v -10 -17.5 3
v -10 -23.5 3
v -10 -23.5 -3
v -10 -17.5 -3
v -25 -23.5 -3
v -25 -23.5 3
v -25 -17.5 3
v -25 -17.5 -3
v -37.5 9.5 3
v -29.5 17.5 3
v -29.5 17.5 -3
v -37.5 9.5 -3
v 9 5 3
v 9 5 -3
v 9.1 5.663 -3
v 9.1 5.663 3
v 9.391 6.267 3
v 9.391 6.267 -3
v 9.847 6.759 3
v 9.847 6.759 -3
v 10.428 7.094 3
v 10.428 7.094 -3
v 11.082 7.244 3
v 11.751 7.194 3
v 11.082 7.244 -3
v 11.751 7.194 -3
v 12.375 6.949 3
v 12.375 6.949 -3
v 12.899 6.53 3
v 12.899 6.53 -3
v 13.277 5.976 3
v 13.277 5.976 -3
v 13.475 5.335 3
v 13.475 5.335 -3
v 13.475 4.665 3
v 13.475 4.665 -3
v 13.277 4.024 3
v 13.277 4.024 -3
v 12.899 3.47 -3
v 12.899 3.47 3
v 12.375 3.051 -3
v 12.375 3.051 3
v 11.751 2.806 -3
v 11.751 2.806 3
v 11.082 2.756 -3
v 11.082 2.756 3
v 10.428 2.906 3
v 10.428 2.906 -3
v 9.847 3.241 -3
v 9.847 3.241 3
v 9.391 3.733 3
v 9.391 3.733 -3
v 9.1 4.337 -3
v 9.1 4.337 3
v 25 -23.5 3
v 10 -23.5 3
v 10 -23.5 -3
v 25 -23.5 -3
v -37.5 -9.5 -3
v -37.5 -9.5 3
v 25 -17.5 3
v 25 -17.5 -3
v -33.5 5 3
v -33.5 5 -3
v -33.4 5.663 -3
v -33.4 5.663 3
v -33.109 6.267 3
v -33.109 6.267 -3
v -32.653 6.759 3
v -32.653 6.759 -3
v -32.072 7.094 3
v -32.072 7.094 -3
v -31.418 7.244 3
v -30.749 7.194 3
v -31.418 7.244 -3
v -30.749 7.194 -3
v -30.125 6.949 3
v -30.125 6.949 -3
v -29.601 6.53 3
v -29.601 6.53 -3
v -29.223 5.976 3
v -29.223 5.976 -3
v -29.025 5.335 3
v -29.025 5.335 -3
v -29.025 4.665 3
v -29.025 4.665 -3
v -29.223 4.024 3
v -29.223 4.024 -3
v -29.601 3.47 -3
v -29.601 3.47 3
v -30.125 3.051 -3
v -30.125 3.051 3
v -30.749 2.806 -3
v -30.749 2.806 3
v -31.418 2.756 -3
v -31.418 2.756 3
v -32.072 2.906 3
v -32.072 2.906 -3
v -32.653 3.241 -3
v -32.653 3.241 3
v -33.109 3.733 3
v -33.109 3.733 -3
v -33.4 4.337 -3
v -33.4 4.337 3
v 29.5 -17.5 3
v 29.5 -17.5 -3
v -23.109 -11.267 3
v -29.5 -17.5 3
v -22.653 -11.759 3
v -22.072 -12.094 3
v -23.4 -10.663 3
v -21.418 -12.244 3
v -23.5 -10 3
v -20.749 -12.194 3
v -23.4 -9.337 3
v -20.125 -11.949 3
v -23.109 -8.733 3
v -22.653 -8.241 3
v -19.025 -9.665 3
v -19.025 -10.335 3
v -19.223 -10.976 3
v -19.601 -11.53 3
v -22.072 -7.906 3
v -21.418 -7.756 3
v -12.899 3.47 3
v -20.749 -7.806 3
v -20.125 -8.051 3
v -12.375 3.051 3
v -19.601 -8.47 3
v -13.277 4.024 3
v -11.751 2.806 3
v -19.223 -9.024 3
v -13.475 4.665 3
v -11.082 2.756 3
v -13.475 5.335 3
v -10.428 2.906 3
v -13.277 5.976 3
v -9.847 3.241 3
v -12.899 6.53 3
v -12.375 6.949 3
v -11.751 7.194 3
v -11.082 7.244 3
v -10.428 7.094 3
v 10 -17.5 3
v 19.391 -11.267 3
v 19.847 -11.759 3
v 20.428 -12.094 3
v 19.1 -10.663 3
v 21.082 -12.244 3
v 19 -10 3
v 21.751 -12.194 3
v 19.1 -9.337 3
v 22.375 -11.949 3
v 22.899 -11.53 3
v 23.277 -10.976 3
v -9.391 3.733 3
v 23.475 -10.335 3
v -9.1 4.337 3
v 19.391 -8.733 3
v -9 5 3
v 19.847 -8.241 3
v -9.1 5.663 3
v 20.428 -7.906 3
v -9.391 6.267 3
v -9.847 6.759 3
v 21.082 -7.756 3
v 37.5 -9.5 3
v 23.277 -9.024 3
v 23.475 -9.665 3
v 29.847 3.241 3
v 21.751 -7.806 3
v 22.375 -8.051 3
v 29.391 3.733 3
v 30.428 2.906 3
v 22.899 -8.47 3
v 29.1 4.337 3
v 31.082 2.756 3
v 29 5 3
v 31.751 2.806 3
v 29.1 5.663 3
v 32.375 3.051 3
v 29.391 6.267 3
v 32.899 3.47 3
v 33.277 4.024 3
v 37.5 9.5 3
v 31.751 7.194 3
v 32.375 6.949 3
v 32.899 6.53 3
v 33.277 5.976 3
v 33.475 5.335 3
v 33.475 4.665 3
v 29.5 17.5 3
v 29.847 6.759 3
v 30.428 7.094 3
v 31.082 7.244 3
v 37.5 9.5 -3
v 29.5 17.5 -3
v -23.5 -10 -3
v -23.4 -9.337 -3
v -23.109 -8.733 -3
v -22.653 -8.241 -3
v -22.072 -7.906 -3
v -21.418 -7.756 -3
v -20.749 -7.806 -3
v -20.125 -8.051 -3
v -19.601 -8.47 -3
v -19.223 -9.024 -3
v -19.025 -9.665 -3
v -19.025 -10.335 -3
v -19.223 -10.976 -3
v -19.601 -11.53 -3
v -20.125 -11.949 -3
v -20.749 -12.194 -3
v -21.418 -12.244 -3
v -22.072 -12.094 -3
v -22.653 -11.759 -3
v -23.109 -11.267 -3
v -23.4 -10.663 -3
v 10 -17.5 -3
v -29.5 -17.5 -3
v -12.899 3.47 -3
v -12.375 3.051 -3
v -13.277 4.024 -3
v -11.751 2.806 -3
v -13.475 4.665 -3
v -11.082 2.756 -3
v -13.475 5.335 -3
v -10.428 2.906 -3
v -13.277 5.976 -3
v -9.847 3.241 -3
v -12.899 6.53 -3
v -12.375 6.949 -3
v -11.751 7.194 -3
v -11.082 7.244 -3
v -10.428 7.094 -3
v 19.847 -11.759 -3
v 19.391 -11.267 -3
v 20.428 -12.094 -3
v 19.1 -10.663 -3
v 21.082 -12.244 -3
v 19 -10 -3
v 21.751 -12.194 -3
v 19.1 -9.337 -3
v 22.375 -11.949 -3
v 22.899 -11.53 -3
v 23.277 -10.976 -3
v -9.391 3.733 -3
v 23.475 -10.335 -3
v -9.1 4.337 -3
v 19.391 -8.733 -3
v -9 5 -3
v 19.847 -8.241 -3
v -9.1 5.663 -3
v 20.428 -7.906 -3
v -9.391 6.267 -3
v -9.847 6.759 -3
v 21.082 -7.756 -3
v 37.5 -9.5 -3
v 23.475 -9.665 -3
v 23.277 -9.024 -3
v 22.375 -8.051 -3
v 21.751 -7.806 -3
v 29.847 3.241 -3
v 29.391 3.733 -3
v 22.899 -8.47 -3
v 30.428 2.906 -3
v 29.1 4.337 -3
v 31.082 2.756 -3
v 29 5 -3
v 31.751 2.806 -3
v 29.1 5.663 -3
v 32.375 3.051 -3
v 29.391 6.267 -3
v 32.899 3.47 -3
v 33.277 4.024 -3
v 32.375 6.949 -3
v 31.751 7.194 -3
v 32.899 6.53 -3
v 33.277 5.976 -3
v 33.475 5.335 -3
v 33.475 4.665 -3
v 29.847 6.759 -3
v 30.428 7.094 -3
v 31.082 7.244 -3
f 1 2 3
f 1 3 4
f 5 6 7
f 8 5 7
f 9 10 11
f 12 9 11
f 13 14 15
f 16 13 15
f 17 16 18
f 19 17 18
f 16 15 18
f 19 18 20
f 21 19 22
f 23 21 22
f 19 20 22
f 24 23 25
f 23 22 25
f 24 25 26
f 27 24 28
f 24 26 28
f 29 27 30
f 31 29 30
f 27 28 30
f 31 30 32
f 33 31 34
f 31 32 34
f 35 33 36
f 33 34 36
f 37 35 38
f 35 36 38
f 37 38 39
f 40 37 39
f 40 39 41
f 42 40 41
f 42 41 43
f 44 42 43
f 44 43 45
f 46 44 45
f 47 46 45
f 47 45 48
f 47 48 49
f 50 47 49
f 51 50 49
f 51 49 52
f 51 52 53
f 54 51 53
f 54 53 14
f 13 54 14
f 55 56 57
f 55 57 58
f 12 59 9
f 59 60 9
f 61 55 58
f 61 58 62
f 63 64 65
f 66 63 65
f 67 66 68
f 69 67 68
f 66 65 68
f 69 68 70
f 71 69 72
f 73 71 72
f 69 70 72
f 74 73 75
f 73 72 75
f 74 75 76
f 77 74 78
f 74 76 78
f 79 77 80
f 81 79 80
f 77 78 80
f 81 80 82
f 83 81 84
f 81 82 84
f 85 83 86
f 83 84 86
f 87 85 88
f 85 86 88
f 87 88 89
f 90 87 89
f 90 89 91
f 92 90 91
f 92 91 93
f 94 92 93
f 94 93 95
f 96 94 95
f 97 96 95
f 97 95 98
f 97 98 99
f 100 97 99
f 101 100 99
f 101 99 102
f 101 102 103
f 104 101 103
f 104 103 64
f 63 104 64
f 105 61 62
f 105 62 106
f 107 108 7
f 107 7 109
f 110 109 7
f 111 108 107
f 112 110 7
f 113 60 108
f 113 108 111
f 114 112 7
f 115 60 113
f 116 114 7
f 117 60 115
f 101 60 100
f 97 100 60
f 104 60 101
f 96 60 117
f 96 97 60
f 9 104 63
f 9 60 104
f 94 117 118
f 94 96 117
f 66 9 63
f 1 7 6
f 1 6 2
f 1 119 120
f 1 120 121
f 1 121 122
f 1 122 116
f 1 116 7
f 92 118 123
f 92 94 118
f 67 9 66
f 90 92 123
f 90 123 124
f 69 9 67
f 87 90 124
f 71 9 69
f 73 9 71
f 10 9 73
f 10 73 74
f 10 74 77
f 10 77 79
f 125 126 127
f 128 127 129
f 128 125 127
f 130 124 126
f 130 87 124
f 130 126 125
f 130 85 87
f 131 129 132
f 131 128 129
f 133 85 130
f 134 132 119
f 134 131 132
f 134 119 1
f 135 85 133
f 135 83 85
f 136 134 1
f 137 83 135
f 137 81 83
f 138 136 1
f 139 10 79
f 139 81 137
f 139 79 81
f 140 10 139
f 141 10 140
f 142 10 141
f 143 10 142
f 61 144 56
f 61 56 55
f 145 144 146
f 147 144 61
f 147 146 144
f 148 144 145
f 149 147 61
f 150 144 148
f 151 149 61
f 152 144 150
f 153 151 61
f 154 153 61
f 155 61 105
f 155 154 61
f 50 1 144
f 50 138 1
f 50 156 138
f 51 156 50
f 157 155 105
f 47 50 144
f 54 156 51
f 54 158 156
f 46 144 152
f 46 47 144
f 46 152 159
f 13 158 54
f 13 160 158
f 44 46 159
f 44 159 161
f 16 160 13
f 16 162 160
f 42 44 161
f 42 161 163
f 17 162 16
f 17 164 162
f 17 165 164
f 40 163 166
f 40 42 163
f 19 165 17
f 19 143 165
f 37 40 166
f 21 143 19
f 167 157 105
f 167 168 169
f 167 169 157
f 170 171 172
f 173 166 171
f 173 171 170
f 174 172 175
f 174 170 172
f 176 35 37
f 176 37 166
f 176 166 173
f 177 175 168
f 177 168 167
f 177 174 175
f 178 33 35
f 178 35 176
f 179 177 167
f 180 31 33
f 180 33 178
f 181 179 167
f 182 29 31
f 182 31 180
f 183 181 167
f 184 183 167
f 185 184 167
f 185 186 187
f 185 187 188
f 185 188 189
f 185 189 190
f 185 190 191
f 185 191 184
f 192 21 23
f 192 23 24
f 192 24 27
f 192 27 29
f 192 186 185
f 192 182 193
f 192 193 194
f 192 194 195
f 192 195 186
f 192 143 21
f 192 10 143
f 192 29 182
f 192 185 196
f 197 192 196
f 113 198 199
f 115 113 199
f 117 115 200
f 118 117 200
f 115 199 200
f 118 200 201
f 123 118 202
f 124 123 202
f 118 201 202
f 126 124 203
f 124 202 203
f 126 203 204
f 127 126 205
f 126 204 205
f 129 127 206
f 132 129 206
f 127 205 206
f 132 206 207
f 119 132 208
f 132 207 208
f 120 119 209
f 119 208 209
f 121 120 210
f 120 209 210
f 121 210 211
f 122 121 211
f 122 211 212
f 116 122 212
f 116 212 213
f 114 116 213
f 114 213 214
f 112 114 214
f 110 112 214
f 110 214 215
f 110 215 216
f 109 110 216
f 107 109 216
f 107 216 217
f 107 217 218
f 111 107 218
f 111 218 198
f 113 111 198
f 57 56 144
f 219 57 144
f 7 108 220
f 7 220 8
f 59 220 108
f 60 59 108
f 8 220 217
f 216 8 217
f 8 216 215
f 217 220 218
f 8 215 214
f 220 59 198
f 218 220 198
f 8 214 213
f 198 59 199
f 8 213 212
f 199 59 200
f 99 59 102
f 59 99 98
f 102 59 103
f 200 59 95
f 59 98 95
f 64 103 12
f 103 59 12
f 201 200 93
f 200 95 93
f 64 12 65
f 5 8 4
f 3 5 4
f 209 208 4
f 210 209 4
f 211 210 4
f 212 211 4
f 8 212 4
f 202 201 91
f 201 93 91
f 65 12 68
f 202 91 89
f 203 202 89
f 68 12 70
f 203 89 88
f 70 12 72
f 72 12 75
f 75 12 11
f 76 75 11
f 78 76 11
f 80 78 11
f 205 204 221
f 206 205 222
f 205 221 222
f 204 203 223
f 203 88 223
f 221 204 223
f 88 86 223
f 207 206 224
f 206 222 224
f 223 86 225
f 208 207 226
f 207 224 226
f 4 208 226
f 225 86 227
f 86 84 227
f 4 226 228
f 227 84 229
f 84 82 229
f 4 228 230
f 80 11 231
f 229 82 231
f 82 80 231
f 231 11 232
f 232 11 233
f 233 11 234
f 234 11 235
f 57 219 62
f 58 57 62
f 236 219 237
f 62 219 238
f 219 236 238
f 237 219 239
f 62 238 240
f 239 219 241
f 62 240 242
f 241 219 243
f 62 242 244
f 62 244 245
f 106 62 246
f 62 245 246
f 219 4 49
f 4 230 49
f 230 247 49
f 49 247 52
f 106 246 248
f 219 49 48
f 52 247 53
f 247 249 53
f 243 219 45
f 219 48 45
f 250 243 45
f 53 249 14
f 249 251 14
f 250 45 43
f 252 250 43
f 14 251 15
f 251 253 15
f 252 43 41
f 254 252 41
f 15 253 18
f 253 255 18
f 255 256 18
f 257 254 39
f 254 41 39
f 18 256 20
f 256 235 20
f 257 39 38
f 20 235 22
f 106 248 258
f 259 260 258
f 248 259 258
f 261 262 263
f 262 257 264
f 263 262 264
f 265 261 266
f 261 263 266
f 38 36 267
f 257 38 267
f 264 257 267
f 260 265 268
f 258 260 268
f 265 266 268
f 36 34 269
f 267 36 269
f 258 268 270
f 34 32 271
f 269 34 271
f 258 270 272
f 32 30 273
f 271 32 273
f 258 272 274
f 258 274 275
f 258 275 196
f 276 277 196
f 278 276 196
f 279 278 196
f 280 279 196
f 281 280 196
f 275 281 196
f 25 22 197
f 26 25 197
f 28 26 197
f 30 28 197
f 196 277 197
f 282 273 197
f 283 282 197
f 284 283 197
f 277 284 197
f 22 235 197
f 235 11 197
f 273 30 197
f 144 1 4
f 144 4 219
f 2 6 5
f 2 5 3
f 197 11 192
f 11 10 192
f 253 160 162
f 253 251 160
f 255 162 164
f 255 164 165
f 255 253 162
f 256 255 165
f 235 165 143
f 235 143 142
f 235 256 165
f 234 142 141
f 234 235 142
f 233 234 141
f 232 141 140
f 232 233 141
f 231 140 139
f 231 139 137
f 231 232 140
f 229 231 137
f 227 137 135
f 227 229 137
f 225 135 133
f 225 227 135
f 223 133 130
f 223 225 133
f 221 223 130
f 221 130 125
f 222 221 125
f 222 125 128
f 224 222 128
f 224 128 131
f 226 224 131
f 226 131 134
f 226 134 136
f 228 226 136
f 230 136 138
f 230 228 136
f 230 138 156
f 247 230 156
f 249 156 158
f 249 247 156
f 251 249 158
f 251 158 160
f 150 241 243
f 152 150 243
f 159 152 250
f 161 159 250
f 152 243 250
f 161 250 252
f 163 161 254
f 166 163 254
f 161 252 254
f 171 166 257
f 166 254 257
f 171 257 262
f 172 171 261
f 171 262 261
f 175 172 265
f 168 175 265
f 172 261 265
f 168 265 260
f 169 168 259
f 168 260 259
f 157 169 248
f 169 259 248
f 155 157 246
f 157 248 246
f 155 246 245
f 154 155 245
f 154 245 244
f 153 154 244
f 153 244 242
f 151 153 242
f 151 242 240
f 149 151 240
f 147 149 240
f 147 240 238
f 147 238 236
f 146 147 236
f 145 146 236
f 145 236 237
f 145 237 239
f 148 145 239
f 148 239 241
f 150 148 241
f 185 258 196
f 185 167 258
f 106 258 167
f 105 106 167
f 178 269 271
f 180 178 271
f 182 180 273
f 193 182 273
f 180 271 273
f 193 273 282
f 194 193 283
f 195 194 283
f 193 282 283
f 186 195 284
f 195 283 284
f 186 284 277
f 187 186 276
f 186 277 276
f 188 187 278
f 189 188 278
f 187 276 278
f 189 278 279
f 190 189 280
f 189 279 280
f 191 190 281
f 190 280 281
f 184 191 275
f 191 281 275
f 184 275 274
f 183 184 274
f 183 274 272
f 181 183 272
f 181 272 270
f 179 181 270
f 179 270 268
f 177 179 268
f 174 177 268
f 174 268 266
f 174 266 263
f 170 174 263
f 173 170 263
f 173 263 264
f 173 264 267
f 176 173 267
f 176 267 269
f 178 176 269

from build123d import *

# Parameters (mm, degrees)
CROQUIS1_W                   = 75
CROQUIS1_H                   = 35
CROQUIS1_R                   = 2.25
SALIENTE_EXTRUIR1_DEPTH      = 3
TALADRO_DE_MARGEN_PARA_M41_D = 4.5
CROQUIS6_W                   = 15
CROQUIS6_H                   = 6
SALIENTE_EXTRUIR2_DEPTH      = 6
CHAFL_N1_SIZE                = 8


with BuildPart() as part:
    # Croquis1 → Saliente-Extruir1 (new, symmetric)
    with BuildSketch(Plane.XY):
        Rectangle(CROQUIS1_W, CROQUIS1_H)
        with Locations((-11.25, 5)):
            Circle(CROQUIS1_R, mode=Mode.SUBTRACT)
    extrude(amount=SALIENTE_EXTRUIR1_DEPTH, both=True)

    # Taladro de margen para M41 (through all)
    with Locations(Plane.XY.offset(3)):
        with Locations((-31.25, 5), (31.25, 5), (11.25, 5), (-21.25, -10), (21.25, -10)):
            Hole(TALADRO_DE_MARGEN_PARA_M41_D / 2)

    # Croquis6 → Saliente-Extruir2 (add, through all)
    with BuildSketch(Plane.XY.offset(3)):
        with Locations((-17.5, -20.5)):
            Rectangle(CROQUIS6_W, CROQUIS6_H)
        with Locations((17.5, -20.5)):
            Rectangle(CROQUIS6_W, CROQUIS6_H)
    extrude(amount=-SALIENTE_EXTRUIR2_DEPTH)

    # Chaflán1
    chafl_n1_edges = [part.edges().sort_by_distance(p)[0] for p in [
        (-37.5, 17.5, 0),
        (37.5, 17.5, 0),
        (37.5, -17.5, 0),
        (-37.5, -17.5, 0),
    ]]
    chamfer(chafl_n1_edges, length=CHAFL_N1_SIZE)


solid = part.part
